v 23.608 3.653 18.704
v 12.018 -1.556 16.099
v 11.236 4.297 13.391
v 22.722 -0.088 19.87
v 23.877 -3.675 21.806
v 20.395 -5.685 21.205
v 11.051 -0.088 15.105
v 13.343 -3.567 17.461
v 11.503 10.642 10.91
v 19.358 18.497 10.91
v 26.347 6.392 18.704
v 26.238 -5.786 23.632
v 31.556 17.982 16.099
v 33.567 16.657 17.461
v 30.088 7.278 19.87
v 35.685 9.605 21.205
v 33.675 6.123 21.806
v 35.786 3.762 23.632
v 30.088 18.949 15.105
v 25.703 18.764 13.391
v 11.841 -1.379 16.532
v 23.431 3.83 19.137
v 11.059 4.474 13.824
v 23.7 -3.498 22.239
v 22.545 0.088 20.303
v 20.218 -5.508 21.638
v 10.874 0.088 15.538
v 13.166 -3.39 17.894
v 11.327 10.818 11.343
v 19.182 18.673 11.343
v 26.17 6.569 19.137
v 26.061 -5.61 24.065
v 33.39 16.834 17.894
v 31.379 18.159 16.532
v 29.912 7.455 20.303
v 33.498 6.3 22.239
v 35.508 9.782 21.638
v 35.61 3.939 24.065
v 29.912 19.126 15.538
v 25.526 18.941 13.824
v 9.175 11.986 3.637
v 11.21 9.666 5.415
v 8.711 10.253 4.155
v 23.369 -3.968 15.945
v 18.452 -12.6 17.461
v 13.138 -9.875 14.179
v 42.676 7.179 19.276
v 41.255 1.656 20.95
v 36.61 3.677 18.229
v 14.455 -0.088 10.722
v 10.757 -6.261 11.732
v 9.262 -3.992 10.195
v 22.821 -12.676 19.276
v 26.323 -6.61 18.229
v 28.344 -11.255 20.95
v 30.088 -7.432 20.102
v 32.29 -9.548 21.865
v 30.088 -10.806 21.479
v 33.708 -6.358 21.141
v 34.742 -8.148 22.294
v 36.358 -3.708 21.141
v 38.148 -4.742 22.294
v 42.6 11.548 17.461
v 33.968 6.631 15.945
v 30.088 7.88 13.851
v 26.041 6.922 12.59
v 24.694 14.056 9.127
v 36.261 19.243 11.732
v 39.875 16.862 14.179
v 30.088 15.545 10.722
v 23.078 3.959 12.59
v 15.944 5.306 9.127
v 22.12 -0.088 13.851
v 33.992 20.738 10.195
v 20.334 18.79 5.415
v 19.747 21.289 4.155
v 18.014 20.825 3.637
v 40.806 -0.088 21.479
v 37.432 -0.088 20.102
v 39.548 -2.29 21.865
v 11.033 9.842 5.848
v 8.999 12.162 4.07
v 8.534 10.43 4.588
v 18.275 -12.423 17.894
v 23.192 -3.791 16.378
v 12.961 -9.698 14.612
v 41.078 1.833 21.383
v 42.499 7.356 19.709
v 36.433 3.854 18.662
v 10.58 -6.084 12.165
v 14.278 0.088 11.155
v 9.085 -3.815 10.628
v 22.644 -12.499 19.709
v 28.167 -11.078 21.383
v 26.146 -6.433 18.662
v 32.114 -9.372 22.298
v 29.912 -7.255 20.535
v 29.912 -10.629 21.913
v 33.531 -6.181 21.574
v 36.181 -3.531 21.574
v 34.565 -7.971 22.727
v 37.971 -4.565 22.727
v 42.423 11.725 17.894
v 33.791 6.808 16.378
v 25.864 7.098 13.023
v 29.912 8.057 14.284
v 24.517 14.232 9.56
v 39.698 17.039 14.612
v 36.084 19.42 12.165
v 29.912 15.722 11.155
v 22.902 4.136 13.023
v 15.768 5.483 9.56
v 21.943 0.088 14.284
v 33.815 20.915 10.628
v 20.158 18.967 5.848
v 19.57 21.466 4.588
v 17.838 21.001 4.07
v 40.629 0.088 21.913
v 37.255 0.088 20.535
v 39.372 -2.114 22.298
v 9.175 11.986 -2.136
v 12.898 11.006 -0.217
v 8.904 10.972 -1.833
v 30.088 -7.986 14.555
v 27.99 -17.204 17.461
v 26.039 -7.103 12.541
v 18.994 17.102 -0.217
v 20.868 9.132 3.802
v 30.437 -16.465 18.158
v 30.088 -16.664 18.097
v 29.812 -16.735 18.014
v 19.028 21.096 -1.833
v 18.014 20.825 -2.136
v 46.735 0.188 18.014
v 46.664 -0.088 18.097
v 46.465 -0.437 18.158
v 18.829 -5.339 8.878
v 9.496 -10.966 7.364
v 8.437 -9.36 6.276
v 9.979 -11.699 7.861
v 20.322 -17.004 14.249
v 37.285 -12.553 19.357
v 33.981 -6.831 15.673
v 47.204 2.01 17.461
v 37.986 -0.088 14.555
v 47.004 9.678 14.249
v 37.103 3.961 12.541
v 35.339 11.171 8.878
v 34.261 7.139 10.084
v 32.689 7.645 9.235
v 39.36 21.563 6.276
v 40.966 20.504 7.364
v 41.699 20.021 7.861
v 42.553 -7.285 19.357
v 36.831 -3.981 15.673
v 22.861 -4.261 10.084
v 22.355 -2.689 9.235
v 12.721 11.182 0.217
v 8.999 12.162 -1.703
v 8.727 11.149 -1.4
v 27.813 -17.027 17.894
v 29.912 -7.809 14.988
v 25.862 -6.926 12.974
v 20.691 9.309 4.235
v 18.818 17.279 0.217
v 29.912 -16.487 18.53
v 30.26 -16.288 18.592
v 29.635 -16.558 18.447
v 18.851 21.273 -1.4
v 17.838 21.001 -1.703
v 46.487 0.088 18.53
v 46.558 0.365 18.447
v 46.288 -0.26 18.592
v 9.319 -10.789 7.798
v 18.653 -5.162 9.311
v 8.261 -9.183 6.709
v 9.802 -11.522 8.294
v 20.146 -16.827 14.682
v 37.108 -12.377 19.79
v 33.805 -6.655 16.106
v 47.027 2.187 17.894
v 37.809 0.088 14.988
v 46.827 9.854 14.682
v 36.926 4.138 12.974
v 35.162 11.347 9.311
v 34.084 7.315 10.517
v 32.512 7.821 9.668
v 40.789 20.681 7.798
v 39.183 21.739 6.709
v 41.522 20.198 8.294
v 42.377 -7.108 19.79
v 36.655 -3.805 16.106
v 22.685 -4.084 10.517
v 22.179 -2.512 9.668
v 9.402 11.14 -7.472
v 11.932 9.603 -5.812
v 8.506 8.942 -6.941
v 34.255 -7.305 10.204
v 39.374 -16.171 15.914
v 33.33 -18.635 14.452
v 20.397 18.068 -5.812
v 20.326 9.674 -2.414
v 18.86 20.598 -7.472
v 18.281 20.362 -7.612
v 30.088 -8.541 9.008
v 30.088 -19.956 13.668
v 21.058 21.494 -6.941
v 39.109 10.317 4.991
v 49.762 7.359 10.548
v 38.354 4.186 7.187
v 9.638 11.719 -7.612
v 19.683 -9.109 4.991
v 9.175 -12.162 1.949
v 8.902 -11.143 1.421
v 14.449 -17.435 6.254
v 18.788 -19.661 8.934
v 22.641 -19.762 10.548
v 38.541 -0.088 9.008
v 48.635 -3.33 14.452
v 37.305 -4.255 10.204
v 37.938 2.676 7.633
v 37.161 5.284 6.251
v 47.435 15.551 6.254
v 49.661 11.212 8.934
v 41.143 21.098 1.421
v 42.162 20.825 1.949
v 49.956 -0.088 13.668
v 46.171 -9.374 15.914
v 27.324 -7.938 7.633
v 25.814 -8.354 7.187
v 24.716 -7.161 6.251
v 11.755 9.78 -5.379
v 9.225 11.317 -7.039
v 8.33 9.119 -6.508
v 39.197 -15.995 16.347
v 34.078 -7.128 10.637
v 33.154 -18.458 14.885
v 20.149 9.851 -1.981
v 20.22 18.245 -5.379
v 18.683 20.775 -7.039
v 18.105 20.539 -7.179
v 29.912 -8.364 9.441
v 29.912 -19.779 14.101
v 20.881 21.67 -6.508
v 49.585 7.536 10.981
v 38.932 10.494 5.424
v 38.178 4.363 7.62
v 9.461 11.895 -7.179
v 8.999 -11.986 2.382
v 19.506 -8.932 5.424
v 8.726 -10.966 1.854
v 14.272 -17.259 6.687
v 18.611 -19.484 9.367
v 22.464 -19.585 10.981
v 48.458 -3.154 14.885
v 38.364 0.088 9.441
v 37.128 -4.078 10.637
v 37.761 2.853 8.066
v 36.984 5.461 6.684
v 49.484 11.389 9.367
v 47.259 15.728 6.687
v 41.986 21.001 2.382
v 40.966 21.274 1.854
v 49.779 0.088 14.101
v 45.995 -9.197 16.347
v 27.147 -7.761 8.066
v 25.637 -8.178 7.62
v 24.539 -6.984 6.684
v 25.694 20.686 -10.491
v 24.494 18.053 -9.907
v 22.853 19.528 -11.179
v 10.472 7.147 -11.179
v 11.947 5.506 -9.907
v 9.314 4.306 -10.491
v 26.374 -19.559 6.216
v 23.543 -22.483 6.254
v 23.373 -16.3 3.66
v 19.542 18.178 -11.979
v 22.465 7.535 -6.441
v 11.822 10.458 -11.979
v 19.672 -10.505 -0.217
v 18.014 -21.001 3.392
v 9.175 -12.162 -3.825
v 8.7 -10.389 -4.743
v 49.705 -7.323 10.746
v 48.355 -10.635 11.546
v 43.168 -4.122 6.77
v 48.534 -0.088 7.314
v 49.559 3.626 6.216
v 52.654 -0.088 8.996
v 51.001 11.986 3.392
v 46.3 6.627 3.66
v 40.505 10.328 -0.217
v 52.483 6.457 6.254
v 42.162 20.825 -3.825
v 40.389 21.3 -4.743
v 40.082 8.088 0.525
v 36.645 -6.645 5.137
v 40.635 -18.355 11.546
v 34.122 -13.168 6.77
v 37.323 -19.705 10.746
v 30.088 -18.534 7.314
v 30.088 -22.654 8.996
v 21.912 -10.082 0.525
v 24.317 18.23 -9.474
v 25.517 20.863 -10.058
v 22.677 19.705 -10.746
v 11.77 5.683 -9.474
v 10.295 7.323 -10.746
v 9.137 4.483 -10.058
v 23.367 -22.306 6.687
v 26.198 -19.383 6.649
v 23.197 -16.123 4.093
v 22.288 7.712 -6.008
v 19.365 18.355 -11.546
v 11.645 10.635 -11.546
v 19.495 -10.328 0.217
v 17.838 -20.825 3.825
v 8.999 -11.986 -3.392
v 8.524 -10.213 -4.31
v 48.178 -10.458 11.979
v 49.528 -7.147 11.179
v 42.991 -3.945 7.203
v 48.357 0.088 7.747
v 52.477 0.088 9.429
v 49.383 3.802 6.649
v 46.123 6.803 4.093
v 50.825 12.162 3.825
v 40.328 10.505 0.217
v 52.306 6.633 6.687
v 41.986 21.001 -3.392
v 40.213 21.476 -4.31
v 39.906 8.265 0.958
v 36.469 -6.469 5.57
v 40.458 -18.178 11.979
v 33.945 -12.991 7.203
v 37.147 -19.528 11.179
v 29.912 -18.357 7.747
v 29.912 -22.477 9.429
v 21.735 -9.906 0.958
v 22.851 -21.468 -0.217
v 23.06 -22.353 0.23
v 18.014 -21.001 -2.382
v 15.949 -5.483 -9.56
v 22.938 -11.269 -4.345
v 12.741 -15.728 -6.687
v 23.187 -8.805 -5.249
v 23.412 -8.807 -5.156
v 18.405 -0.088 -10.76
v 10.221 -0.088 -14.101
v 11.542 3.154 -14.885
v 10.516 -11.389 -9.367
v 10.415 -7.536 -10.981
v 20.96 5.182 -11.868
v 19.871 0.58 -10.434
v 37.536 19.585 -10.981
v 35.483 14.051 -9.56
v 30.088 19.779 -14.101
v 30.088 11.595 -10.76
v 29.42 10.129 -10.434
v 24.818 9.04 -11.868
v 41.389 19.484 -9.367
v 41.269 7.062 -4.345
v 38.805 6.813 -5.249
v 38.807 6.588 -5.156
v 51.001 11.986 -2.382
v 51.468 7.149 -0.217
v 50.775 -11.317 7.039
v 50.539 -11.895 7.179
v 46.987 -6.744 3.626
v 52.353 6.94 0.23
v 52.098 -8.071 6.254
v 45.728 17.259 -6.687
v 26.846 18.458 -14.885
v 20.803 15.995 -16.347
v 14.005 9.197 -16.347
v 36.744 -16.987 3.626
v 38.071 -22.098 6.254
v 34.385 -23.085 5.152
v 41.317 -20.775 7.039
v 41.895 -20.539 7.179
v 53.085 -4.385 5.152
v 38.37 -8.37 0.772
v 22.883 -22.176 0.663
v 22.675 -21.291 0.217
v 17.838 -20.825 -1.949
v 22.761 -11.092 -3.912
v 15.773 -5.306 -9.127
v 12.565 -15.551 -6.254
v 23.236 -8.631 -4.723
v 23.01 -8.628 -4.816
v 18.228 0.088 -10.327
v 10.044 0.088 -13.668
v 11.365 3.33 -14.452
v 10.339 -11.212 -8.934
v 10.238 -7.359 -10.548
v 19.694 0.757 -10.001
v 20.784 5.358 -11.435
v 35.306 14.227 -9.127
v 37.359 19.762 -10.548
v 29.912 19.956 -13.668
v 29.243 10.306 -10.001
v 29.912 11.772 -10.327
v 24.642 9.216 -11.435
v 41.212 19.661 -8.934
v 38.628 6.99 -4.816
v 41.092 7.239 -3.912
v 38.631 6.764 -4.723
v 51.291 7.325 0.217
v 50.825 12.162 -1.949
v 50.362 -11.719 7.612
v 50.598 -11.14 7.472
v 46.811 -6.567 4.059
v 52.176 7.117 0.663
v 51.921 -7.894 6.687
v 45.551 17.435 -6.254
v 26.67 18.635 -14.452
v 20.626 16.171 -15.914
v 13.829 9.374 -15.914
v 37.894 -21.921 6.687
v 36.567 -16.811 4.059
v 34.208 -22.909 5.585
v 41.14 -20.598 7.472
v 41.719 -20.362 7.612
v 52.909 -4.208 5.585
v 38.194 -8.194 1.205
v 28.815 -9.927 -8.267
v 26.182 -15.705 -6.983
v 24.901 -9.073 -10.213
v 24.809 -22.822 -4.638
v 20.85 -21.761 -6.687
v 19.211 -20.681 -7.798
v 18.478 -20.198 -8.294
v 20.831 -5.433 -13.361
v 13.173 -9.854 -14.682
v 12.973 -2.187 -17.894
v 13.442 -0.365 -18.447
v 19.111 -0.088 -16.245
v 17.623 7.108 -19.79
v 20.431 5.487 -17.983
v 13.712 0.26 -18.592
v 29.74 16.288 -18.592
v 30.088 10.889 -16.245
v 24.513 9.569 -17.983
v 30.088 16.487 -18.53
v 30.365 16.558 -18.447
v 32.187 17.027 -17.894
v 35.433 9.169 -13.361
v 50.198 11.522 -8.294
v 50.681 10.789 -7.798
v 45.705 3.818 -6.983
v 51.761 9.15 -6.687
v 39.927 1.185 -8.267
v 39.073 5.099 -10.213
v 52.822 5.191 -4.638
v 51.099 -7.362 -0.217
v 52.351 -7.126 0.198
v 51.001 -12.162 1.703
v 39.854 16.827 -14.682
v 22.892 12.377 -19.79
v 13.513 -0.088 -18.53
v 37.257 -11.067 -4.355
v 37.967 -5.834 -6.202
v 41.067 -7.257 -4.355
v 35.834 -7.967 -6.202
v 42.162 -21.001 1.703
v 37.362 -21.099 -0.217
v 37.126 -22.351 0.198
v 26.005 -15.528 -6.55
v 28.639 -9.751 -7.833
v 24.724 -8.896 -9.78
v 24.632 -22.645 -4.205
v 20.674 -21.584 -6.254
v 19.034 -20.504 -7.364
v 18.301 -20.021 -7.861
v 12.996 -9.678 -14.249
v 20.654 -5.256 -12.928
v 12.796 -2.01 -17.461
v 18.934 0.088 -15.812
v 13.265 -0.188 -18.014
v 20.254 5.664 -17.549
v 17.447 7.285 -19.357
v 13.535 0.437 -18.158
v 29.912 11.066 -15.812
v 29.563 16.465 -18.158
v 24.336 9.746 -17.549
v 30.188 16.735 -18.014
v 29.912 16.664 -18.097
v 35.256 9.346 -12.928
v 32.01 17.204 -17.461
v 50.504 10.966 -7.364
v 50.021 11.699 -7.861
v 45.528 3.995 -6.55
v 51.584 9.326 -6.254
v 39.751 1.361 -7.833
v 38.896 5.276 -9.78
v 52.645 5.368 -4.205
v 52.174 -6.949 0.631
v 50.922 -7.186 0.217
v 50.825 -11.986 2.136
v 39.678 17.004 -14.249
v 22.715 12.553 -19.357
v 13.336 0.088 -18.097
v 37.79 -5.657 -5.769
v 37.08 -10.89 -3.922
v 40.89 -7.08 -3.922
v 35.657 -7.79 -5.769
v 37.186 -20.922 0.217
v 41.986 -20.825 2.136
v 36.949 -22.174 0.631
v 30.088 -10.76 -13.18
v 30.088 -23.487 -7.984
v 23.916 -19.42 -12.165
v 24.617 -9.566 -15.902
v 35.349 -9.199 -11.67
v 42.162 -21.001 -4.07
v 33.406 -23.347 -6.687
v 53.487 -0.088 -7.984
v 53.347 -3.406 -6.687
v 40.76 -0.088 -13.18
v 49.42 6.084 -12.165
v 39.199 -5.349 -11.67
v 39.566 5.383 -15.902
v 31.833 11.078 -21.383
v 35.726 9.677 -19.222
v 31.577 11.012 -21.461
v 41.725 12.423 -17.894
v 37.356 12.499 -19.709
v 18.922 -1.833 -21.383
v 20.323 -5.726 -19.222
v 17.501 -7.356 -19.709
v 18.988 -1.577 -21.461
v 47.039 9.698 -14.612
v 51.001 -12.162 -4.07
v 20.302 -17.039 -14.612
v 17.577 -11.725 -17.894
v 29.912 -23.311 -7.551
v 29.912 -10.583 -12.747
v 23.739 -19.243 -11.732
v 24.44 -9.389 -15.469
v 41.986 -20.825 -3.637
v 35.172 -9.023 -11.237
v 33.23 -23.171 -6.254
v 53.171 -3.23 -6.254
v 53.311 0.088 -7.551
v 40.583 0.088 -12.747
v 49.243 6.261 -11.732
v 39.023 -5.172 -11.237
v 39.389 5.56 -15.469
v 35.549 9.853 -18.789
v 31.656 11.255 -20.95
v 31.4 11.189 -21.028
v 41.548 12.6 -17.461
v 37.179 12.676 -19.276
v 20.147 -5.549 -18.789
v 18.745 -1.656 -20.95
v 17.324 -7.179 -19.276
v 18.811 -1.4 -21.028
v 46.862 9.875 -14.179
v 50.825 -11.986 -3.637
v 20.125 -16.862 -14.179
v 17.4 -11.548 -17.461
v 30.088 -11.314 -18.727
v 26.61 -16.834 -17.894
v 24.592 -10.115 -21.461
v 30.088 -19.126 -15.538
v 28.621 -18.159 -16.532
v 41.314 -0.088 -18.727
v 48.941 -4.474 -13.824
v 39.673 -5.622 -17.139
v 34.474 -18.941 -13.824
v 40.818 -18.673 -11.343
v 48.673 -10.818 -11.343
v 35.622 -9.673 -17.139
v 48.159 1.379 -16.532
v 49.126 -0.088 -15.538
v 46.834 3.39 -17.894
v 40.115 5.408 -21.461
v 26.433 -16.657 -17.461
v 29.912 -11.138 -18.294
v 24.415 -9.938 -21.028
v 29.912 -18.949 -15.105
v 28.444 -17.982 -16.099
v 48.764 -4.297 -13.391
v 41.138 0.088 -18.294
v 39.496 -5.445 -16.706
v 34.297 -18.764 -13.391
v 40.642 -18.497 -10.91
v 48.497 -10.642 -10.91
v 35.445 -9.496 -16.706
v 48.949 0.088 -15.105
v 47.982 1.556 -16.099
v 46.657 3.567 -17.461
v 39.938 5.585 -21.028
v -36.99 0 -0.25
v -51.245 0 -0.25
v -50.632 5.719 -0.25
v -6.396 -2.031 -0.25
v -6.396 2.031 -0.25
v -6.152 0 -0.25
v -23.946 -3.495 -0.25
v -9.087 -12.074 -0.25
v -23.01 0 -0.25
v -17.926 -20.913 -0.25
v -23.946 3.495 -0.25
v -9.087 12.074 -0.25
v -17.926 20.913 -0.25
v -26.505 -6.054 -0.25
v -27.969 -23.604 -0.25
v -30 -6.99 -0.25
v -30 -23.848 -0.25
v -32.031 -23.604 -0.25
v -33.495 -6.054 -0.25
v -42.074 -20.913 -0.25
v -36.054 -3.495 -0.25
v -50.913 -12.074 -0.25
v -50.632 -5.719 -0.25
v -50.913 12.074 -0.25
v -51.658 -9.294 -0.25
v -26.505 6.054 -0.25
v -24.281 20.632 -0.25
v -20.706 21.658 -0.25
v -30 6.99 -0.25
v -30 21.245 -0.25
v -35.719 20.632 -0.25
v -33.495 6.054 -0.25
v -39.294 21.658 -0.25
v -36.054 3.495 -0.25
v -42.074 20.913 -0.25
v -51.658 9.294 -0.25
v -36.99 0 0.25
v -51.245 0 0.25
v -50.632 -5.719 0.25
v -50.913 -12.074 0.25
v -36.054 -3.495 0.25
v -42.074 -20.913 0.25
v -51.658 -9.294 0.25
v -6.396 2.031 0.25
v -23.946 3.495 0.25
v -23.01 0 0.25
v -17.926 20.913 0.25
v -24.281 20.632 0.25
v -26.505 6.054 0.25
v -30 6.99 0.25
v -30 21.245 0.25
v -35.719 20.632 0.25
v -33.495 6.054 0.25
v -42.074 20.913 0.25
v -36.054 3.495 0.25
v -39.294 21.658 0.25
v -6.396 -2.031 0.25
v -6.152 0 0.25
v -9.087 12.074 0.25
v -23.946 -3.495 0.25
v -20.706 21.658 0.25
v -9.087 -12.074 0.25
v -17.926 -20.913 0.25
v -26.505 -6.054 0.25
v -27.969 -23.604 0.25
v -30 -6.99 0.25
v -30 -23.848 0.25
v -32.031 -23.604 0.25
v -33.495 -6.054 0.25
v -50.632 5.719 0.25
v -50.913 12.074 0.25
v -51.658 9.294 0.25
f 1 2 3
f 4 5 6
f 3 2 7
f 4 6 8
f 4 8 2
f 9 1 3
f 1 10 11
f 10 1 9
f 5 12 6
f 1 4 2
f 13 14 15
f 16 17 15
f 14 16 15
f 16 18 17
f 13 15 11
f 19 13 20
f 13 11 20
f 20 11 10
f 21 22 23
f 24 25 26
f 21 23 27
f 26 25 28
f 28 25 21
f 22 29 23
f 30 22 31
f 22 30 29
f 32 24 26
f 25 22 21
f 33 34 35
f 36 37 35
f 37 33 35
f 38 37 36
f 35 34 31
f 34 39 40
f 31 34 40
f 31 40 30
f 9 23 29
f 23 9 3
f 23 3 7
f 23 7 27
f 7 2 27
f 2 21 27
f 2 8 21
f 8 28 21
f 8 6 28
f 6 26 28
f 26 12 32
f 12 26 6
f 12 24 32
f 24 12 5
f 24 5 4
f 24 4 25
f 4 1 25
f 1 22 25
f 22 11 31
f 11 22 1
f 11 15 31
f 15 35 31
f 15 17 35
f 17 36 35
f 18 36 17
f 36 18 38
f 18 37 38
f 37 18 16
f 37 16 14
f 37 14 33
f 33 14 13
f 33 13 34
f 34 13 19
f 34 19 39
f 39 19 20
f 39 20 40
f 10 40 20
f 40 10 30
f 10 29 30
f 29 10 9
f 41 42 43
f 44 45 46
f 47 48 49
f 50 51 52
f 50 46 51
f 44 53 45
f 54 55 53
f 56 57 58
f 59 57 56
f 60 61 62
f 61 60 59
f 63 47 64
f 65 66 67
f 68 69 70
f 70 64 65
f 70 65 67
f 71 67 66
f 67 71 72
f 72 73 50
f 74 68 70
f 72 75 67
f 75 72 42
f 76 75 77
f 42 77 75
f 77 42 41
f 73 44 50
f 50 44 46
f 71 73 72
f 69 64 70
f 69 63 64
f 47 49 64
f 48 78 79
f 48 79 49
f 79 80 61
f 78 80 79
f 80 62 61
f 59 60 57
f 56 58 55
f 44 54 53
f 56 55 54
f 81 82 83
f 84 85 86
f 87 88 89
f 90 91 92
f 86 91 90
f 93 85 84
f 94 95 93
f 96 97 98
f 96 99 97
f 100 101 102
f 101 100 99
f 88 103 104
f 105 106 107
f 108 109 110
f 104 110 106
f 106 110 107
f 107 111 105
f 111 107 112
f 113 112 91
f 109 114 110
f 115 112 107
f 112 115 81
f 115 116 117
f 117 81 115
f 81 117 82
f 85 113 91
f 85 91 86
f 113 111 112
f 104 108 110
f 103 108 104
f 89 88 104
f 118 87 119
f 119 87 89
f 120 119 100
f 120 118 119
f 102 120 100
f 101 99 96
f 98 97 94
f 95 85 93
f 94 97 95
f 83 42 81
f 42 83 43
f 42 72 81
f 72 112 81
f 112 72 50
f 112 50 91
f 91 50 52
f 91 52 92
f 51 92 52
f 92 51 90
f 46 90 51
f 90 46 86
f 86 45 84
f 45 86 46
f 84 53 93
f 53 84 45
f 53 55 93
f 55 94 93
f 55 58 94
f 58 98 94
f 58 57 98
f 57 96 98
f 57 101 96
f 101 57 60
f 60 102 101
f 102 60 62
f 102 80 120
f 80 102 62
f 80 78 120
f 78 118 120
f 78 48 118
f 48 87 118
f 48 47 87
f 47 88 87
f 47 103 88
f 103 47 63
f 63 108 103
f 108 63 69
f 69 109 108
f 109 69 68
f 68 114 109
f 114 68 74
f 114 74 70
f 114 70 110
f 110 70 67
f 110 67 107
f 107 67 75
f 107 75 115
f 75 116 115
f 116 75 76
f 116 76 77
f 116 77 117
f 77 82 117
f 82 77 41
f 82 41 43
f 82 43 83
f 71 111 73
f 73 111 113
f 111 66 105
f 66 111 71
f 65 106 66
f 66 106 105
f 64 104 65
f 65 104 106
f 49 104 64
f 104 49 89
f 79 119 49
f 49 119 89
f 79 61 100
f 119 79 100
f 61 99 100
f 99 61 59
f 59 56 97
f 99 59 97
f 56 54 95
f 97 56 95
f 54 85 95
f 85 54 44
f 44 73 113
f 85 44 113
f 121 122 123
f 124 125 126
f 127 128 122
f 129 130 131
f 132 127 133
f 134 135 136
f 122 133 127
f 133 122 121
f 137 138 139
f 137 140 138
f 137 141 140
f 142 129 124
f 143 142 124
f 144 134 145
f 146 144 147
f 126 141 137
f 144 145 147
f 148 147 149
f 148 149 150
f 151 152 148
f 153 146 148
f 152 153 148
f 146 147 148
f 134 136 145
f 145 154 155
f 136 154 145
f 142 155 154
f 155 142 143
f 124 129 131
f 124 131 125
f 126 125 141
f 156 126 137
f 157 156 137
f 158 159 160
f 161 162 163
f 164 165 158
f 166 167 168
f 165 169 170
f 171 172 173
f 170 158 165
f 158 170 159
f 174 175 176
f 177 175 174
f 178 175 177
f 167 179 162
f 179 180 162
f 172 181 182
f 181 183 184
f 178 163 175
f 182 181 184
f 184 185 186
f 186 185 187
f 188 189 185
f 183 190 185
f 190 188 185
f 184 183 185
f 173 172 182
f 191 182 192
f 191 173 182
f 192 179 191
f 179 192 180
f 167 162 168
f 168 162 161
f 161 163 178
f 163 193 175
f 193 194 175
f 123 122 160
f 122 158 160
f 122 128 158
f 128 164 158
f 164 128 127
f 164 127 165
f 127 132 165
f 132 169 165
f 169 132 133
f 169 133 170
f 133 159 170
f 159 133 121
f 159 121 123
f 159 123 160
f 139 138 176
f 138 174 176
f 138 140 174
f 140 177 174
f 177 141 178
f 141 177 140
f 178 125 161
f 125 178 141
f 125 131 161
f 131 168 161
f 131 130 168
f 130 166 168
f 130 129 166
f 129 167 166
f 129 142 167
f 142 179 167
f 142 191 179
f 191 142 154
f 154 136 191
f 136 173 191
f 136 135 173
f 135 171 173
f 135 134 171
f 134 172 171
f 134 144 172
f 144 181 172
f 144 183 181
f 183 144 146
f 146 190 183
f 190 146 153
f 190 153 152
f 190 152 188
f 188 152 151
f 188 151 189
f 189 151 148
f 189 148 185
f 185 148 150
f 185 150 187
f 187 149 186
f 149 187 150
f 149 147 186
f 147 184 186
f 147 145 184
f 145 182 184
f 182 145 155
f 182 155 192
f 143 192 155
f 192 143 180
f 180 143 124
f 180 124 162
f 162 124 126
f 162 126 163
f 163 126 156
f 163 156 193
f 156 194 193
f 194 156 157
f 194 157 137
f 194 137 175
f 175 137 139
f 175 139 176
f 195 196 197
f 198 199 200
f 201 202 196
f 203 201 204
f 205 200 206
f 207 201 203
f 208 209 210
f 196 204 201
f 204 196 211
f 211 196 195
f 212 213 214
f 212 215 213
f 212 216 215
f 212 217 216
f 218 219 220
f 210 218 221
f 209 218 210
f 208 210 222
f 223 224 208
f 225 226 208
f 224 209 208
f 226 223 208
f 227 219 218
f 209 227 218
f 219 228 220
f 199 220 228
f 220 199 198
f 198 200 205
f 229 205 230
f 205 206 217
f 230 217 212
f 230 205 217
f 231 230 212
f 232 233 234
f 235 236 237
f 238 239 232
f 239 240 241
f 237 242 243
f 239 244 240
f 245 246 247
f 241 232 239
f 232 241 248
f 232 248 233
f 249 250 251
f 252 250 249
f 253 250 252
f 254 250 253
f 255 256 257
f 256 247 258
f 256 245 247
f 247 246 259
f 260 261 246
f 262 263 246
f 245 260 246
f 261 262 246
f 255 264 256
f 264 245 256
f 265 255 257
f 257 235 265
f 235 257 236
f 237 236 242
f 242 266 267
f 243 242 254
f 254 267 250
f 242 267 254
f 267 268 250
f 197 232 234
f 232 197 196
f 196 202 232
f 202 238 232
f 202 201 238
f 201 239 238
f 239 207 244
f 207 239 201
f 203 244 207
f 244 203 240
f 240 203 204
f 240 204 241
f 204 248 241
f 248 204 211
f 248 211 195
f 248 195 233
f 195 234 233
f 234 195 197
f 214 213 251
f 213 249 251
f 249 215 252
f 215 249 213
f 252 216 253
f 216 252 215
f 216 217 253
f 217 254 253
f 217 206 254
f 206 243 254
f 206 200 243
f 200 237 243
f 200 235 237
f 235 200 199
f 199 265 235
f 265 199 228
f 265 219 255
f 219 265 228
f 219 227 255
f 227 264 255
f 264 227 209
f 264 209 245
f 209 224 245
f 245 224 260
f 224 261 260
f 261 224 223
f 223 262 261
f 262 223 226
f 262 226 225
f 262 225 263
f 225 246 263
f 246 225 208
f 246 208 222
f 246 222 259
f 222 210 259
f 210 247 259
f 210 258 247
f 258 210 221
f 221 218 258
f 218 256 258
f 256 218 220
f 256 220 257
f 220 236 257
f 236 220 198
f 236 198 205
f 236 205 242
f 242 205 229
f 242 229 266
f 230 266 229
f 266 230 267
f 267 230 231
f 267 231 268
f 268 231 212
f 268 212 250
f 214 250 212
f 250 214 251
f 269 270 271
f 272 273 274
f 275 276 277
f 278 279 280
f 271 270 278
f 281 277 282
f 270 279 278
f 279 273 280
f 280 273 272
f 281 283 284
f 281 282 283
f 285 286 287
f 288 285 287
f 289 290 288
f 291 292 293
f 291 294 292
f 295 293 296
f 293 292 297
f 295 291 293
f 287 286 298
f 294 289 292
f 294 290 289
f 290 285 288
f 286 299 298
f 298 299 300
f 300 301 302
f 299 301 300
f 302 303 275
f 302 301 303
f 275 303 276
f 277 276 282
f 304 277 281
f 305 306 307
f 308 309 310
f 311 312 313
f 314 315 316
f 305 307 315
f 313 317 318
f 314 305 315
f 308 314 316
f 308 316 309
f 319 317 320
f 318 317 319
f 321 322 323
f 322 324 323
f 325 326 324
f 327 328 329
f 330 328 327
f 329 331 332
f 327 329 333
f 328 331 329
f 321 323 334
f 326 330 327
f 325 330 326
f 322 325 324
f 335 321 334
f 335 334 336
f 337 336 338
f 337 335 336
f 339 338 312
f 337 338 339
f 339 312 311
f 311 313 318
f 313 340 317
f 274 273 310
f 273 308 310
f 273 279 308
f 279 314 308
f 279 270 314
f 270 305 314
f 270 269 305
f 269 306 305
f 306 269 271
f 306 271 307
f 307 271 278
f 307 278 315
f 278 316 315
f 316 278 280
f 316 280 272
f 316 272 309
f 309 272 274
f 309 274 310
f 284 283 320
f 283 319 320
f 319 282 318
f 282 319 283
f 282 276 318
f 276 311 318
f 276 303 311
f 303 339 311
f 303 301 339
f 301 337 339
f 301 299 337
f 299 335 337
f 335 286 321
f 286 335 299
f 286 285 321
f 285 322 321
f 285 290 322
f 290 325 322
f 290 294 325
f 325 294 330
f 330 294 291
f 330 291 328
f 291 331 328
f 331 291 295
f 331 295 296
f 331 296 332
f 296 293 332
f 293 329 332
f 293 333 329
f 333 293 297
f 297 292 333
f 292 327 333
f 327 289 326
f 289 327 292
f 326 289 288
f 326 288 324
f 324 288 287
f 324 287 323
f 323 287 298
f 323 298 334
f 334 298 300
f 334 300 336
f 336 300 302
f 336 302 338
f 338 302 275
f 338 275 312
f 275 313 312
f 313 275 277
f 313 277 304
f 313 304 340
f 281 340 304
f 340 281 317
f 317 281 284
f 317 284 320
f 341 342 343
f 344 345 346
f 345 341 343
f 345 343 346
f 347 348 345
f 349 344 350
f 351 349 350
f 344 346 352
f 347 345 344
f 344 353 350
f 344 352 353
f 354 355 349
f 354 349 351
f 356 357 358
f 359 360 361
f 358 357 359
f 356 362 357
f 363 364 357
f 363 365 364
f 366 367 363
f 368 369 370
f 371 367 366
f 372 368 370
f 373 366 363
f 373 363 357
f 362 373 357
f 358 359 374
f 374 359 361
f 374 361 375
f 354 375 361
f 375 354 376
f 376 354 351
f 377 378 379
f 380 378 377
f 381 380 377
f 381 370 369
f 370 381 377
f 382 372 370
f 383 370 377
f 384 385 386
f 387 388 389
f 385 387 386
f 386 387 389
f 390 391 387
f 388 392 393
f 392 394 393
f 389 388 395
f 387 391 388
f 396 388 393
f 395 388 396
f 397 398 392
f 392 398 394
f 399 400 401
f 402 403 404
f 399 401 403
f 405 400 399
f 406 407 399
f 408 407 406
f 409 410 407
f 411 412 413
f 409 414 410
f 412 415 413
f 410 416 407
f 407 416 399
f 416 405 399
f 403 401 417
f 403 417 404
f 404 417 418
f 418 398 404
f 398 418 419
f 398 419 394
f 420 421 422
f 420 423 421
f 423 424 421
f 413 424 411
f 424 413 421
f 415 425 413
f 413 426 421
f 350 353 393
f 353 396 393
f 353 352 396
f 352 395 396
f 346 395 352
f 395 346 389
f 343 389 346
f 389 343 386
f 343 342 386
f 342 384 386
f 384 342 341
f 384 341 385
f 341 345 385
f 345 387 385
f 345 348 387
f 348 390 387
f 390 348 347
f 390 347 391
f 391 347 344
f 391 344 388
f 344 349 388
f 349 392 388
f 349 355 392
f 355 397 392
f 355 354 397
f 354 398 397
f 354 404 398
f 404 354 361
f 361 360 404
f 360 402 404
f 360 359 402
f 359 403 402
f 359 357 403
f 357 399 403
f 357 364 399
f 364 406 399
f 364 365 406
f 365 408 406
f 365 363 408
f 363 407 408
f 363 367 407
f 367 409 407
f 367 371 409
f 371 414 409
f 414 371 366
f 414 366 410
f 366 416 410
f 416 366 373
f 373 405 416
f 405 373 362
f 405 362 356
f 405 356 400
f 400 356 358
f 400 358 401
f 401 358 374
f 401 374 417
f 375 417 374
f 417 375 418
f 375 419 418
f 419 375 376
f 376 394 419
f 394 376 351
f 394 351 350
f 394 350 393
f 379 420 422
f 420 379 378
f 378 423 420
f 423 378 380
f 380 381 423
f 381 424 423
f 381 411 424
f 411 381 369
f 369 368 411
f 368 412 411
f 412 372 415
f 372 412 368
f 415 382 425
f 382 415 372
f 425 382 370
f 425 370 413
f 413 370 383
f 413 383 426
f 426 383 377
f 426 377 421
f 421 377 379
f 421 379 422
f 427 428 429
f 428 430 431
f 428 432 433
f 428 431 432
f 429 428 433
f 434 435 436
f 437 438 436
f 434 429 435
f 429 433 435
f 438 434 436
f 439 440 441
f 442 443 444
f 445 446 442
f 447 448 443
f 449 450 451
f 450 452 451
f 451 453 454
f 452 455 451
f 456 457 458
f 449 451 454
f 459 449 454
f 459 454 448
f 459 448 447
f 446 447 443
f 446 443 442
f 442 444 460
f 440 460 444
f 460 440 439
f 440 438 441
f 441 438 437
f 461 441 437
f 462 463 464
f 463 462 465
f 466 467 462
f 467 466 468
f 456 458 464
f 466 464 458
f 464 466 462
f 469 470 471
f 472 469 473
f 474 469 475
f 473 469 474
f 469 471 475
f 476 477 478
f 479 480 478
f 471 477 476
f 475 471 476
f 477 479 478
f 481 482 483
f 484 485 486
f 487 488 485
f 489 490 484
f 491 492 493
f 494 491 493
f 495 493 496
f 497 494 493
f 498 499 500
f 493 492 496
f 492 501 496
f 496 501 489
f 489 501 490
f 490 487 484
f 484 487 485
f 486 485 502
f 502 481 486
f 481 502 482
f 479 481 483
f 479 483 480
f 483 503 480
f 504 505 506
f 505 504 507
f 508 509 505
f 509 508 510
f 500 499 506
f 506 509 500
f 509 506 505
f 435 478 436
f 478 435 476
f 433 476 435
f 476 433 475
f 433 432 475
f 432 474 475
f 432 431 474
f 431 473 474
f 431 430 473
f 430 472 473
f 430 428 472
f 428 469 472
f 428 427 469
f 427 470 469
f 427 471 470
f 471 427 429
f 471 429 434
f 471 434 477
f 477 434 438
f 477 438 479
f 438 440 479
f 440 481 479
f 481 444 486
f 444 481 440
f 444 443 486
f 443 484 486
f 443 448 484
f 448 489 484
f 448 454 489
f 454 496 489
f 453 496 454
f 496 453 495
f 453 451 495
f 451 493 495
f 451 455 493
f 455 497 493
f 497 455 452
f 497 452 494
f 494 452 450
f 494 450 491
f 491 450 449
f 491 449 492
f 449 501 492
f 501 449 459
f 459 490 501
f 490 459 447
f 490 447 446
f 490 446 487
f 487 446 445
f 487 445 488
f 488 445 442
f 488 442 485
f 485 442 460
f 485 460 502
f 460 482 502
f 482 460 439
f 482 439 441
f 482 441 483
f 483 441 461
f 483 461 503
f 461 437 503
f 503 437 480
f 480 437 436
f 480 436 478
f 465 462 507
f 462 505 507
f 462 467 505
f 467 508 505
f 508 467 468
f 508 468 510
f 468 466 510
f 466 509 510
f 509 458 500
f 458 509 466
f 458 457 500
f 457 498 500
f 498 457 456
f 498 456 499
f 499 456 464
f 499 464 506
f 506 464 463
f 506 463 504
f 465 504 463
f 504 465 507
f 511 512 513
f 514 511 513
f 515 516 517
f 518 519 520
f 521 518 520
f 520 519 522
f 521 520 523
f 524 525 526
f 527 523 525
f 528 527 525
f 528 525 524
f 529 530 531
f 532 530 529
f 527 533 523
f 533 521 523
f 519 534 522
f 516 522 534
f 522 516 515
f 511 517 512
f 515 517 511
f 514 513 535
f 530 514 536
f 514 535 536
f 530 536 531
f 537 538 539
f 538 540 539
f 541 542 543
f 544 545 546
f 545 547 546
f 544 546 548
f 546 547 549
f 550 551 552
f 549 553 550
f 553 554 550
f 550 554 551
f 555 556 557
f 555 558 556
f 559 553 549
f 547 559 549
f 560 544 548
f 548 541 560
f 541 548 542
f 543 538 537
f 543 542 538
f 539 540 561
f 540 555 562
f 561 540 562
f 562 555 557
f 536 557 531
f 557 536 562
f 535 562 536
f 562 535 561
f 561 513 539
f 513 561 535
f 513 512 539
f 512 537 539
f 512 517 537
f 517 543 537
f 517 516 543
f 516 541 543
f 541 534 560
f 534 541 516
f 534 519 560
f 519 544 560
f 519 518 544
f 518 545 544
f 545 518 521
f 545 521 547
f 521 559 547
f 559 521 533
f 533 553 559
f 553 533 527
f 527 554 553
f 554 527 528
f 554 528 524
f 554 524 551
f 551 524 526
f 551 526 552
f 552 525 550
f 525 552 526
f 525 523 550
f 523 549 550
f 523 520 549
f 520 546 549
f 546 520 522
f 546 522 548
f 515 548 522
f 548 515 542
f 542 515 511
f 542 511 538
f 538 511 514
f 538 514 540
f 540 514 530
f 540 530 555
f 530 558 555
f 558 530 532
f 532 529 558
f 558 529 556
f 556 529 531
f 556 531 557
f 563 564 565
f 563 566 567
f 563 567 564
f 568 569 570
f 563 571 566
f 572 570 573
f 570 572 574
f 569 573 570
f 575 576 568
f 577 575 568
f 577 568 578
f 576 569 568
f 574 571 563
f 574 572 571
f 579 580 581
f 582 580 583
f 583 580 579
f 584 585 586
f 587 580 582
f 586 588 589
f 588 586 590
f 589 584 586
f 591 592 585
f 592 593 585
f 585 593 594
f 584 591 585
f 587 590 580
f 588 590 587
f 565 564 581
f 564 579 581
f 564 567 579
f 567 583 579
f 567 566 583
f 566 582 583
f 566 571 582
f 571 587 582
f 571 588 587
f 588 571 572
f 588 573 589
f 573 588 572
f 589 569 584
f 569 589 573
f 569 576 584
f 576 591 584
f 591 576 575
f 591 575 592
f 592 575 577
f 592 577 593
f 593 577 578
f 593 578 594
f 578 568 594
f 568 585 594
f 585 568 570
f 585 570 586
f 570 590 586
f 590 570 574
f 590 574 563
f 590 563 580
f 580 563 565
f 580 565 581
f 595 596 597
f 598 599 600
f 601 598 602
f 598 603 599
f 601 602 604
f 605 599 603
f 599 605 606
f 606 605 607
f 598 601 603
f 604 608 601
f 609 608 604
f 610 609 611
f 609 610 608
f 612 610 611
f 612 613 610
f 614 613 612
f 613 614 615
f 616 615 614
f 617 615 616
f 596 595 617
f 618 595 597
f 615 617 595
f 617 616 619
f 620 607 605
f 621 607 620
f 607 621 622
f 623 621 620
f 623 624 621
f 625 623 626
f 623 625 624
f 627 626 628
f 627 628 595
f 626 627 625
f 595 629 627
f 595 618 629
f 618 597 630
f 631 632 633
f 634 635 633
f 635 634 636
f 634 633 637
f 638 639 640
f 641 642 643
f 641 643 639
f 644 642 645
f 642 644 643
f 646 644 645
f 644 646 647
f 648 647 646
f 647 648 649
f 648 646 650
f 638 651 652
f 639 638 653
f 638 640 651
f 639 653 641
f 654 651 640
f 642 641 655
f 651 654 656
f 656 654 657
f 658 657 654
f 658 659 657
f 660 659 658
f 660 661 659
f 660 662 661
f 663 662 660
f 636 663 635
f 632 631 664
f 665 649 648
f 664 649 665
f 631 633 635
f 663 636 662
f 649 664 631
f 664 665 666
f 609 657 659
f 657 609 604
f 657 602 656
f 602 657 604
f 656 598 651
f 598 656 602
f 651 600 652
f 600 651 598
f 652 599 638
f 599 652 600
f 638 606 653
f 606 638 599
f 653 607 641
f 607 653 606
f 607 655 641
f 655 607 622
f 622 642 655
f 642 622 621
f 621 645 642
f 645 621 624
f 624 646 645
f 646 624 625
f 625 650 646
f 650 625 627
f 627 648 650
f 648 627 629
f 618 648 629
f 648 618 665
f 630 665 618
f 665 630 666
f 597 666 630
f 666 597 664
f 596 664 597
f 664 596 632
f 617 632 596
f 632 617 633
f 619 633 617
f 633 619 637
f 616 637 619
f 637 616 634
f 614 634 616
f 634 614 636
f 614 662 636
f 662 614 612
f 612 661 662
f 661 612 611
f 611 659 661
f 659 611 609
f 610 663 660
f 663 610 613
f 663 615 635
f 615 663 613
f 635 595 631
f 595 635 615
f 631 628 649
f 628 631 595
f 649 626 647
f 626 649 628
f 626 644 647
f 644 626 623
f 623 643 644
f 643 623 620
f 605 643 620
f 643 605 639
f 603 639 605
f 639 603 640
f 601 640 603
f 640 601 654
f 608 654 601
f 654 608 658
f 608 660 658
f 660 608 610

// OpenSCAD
module thing() {
    $fa = 30;
    difference() {
        sphere(r = 25);
        cylinder(h = 62.5, r1 = 12.5, r2 = 6.25, center = true);
        rotate(90, [1, 0, 0]) cylinder(
            h = 62.5,
            r1 = 12.5,
            r2 = 6.25,
            center = true
        );
        rotate(90, [0, 1, 0]) cylinder(
            h = 62.5,
            r1 = 12.5,
            r2 = 6.25,
            center = true
        );
    }
}

module demo_proj() {
    linear_extrude(center = true, height = 0.5) projection(cut = false) thing();
    %thing();
}

module demo_cut() {
    for (i = [-20:5:+20]) {
        rotate(-30, [1, 1, 0]) translate([0, 0, -i])
            linear_extrude(center = true, height = 0.5) projection(cut = true)
                translate([0, 0, i]) rotate(+30, [1, 1, 0]) thing();
    }
    %thing();
}

echo(version = version());
translate([-30, 0, 0]) demo_proj();
translate([+30, 0, 0]) demo_cut();

// Written by Clifford Wolf <clifford@clifford.at> and Marius
// Kintel <marius@kintel.net>
//
// To the extent possible under law, the author(s) have dedicated all
// copyright and related and neighboring rights to this software to the
// public domain worldwide. This software is distributed without any
// warranty.
//
// You should have received a copy of the CC0 Public Domain
// Dedication along with this software.
// If not, see <http://creativecommons.org/publicdomain/zero/1.0/>.
